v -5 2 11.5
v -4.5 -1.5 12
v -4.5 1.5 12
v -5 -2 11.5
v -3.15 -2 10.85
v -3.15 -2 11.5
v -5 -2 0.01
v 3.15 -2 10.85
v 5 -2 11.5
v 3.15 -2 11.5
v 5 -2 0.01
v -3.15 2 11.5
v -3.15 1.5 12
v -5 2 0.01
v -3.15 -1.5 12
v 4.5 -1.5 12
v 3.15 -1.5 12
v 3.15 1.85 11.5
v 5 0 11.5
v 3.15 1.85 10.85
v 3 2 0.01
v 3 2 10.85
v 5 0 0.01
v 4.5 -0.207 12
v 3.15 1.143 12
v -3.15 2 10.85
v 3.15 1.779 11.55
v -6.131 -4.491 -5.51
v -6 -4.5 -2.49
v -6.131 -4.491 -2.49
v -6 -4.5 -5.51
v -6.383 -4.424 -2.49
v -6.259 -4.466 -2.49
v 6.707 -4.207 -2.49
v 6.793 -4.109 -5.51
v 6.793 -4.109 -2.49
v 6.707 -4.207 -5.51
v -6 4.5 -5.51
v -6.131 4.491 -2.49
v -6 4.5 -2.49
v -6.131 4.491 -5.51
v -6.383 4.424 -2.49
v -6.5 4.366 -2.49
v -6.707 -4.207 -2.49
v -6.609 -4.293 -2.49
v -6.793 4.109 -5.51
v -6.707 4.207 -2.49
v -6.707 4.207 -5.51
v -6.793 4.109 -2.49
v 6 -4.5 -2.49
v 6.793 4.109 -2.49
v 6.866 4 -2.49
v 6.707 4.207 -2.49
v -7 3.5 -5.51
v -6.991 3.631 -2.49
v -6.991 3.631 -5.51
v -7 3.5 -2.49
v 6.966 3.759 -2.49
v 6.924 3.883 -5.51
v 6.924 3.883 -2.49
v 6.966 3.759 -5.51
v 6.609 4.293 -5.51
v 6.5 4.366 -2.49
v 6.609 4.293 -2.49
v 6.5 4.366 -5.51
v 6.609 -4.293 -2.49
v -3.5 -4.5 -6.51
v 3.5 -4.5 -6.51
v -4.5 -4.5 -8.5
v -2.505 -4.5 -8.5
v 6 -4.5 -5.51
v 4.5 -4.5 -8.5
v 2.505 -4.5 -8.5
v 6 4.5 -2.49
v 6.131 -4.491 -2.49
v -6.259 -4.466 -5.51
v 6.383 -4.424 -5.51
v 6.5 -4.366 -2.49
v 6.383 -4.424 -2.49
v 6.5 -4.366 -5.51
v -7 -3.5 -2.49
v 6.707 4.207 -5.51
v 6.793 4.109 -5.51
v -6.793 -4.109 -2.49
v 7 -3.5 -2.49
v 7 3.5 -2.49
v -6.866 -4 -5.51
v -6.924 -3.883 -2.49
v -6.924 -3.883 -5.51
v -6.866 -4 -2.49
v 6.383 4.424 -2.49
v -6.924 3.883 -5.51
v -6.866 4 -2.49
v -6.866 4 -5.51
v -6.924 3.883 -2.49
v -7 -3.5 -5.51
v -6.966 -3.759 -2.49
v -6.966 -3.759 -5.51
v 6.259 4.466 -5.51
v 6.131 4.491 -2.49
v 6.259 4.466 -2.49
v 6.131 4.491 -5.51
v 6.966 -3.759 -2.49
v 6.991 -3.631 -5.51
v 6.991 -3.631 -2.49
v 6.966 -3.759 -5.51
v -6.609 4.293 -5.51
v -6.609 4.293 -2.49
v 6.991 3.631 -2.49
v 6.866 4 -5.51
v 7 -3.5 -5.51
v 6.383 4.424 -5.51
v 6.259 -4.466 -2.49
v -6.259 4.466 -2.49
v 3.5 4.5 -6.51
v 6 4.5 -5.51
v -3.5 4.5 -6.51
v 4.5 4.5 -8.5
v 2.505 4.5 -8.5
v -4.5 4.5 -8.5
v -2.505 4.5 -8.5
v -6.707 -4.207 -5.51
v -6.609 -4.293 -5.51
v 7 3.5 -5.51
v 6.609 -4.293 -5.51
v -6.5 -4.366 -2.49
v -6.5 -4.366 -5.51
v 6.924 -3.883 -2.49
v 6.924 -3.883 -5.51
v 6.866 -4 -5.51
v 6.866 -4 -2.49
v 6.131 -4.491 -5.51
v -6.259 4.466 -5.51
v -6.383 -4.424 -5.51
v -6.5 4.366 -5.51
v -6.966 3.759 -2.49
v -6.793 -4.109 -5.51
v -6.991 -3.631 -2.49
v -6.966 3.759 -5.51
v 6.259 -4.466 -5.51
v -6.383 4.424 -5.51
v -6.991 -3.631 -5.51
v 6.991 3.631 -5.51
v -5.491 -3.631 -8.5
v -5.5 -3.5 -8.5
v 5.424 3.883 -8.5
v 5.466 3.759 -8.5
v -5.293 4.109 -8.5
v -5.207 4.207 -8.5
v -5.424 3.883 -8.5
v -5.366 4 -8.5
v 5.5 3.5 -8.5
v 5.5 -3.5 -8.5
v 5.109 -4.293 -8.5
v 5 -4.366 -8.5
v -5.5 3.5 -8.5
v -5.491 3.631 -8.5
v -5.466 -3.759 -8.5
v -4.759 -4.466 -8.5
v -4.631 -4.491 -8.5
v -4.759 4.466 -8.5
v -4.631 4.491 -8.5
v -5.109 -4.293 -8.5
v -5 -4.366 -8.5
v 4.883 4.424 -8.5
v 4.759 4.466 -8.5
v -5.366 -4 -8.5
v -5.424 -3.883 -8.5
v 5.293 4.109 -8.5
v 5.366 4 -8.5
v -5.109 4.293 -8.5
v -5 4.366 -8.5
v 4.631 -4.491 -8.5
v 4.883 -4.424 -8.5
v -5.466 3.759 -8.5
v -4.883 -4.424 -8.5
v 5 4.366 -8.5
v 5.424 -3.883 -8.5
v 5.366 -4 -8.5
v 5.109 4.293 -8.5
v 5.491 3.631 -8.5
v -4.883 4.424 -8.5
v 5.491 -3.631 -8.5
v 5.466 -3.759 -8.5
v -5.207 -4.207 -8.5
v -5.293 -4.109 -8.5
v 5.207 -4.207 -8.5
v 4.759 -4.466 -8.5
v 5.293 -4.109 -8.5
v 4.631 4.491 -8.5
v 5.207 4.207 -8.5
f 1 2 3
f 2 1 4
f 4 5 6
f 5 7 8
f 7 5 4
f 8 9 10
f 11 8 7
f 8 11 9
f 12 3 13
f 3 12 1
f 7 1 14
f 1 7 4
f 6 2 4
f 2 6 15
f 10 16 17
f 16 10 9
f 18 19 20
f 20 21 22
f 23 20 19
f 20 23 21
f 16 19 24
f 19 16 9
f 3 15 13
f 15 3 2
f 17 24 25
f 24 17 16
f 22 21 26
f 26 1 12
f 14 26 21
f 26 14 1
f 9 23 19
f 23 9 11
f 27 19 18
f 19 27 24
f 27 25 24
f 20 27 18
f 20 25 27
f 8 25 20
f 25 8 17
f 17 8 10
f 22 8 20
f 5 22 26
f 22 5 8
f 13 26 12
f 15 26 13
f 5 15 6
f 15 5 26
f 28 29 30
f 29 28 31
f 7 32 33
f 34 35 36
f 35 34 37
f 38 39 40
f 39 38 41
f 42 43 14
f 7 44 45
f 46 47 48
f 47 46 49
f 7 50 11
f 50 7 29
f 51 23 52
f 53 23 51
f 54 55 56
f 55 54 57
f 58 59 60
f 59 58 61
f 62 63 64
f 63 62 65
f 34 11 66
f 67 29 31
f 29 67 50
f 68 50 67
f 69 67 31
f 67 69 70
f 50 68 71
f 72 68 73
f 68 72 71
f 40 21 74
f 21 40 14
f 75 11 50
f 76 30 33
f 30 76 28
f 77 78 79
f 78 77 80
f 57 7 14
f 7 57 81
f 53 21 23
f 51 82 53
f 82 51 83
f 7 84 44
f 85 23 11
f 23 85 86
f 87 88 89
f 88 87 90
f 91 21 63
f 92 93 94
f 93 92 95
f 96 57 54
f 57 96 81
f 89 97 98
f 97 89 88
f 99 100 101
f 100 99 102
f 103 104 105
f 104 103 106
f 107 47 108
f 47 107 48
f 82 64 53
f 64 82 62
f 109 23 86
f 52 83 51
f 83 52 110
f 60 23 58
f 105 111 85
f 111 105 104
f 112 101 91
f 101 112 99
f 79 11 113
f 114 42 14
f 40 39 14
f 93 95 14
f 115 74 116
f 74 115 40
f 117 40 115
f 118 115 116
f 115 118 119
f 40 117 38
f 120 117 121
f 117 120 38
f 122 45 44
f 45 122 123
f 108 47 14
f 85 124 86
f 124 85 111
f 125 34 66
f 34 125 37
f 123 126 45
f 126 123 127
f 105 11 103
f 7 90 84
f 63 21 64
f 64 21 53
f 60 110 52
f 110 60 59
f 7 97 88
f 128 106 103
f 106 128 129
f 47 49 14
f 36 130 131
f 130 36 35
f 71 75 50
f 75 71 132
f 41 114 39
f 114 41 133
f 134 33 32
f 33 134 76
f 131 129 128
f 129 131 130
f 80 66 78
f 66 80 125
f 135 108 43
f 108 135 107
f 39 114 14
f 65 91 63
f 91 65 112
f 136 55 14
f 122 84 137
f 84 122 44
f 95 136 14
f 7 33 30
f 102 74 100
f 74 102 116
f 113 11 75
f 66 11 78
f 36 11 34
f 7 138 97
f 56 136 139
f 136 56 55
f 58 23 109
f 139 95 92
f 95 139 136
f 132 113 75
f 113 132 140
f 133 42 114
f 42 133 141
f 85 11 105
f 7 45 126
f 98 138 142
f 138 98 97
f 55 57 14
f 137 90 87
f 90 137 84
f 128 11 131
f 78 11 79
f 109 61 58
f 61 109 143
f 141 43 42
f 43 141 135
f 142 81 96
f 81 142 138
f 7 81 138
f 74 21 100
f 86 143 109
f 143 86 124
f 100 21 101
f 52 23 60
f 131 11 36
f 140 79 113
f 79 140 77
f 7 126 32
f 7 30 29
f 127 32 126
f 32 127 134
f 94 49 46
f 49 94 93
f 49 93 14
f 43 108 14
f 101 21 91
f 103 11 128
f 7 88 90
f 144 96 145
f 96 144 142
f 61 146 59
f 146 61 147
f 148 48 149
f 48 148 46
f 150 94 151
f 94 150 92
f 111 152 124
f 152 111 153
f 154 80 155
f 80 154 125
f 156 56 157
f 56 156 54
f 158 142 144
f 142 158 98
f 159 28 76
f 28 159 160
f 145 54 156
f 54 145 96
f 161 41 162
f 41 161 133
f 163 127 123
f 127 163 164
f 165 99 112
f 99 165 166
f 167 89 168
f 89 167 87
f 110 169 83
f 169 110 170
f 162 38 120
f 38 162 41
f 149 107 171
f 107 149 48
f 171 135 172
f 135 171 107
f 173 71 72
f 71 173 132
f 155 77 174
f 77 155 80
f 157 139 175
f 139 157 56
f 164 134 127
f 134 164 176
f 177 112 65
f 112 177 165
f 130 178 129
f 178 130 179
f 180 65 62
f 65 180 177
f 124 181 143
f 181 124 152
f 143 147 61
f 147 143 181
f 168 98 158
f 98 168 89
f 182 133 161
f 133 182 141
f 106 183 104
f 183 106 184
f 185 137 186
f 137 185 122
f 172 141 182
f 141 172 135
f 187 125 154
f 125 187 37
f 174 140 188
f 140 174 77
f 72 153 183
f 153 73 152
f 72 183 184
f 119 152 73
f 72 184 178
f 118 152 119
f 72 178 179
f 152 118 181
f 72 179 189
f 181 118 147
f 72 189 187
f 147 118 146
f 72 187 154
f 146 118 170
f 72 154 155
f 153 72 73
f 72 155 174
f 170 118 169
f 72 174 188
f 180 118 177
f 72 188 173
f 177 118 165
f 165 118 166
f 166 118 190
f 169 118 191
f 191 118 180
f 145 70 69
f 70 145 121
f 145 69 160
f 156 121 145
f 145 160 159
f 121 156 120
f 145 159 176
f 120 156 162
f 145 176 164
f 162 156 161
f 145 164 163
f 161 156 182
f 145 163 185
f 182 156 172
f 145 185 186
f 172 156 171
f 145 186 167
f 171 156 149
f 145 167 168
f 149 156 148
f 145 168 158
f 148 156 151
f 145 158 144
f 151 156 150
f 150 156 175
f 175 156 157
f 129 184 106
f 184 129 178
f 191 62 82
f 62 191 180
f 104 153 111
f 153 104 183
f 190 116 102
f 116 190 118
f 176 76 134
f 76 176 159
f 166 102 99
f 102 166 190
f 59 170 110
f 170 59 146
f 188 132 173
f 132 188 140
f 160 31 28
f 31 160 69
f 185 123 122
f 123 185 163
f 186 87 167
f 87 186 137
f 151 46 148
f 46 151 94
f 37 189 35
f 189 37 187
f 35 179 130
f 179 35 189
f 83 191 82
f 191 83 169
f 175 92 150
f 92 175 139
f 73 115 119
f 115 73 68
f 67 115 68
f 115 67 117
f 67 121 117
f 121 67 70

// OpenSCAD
// =====================================================================
//  tip_E_carrier.scad — SP1 tip E: B45 blade on a TPU 90A "pulp" pad
//  PROJECT SCRATCH · 05-engineering/cad/tips · units: mm
//  THREE BODIES, selected with PART:
//    "carrier"  rigid PETG: TM1 tang + shoulder + 3 mm block with a dovetail
//               slot (5 mm mouth / 7 mm top, 2 mm deep) running through in Y
//    "pad"      TPU 90A 10 x 10 x 6 mm pad with the dovetail rail on top; its
//               +X face is chamfered 45 deg — the blade bonds onto that face
//    "blade"    1.0 mm nylon/PETG sheet blade blank, 8 x 9 mm, convex R 9 end
//               (print as a cutting template, or print in PETG 0.12 mm layers)
//    "assembly" preview of all three
//  Scratch direction +X.  Pad slides in along Y; fix with a drop of CA.
//  Edge lowest point about z = -16.5 after radiusing (-16.6 for the square
//  blank; 4.0 mm lower than W's -12.5).  For the same engagement, set the float
//  down-stop 4.0 mm HIGHER (or read E 4 mm lower on the pointer) when running E.
//  Print: carrier PETG tang down, 0.10 mm; pad TPU 90A lying on its Y face;
//  blade: cut from 1.0 mm nylon sheet (use the printed blank as a template).
// =====================================================================
include <tm1_tang_lib.scad>
$fn = TM1_FN;

PART        = "carrier";   // "carrier" | "pad" | "blade" | "assembly"
BLOCK_H     = 3.0;         // carrier block below the band
BLOCK_X     = 11.0;        // carrier block bottom width (drafted from 14)
DT_MOUTH    = 5.0;         // dovetail width at the block bottom (mouth)
DT_TOP      = 7.0;         // dovetail width at the top of the slot
DT_DEPTH    = 2.0;
DT_CLEAR    = 0.15;        // per side, on the TPU rail
PAD_X       = 10.0;
PAD_Y       = 10.0;
PAD_H       = 6.0;
PAD_ATTACK  = 45;          // blade face angle
PAD_REAR_DRAFT = 10;
BLADE_W     = 8.0;
BLADE_LEN   = 9.0;
BLADE_T     = 1.0;
BLADE_OVERHANG = 2.0;      // blade edge beyond the pad's bottom-front corner (along the face)
BLADE_CROWN_R  = 9.0;
CROSS_HOLE  = false;

ZB = TM1_SH_BOT - BLOCK_H;   // -8.5 : carrier block bottom = pad top

// trapezoid (in XZ) extruded along Y, centred: used for the dovetail slot and rail
module dovetail_xz(w_bot, w_top, z_bot, depth, len) {
    rotate([90, 0, 0]) linear_extrude(height = len, center = true)
        polygon([[-w_bot / 2, z_bot], [w_bot / 2, z_bot], [w_top / 2, z_bot + depth], [-w_top / 2, z_bot + depth]]);
}

module tip_E_carrier(cross_hole = CROSS_HOLE) {
    tm1_tip_base(cross_hole);
    difference() {
        hull() {
            tm1_band_slab();
            translate([0, 0, ZB]) linear_extrude(height = 0.02) tm1_rrect(BLOCK_X, TM1_SH_Y, TM1_SH_R);
        }
        dovetail_xz(DT_MOUTH, DT_TOP, ZB - 0.01, DT_DEPTH, TM1_SH_Y + 2);
    }
}

module tip_E_pad() {
    // rail (slides into the carrier dovetail along Y)
    dovetail_xz(DT_MOUTH - 2 * DT_CLEAR, DT_TOP - 2 * DT_CLEAR, ZB - 0.01, DT_DEPTH - DT_CLEAR, PAD_Y);
    // pad block: XZ profile, 45 deg front chamfer (+X), 10 deg rear draft (-X)
    rotate([90, 0, 0]) linear_extrude(height = PAD_Y, center = true)
        polygon([[-PAD_X / 2, ZB], [PAD_X / 2, ZB],
                 [PAD_X / 2 - PAD_H / tan(PAD_ATTACK), ZB - PAD_H],
                 [-PAD_X / 2 + PAD_H * tan(PAD_REAR_DRAFT), ZB - PAD_H]]);
}

// flat blade blank lying in XY (print flat or use as a cutting template)
module tip_E_blade() {
    linear_extrude(height = BLADE_T)
        offset(r = 1.5) offset(delta = -1.5)
            intersection() {
                translate([-BLADE_W / 2, 0]) square([BLADE_W, BLADE_LEN]);
                translate([0, BLADE_LEN - BLADE_CROWN_R]) circle(r = BLADE_CROWN_R, $fn = 180);
            }
}

// blade placed on the pad's 45 deg face (preview only): length axis runs down the
// face (-u), thickness points outward (+n), edge overhangs the bottom-front corner.
module tip_E_blade_placed() {
    cx = PAD_X / 2 - PAD_H / tan(PAD_ATTACK);     // pad bottom-front corner
    cz = ZB - PAD_H;
    ux = cos(PAD_ATTACK);  uz = sin(PAD_ATTACK);  // up the face
    nx = sin(PAD_ATTACK);  nz = -cos(PAD_ATTACK); // outward normal of the face
    s  = BLADE_LEN - BLADE_OVERHANG;
    translate([cx + s * ux + nx * BLADE_T, 0, cz + s * uz + nz * BLADE_T])
        rotate([0, -PAD_ATTACK, 0]) rotate([0, 0, 90]) tip_E_blade();
}

if (PART == "carrier") tip_E_carrier();
if (PART == "pad") tip_E_pad();
if (PART == "blade") tip_E_blade();
if (PART == "assembly") {
    color("orange") tip_E_carrier();
    color("gray") tip_E_pad();
    color("white") tip_E_blade_placed();
}
